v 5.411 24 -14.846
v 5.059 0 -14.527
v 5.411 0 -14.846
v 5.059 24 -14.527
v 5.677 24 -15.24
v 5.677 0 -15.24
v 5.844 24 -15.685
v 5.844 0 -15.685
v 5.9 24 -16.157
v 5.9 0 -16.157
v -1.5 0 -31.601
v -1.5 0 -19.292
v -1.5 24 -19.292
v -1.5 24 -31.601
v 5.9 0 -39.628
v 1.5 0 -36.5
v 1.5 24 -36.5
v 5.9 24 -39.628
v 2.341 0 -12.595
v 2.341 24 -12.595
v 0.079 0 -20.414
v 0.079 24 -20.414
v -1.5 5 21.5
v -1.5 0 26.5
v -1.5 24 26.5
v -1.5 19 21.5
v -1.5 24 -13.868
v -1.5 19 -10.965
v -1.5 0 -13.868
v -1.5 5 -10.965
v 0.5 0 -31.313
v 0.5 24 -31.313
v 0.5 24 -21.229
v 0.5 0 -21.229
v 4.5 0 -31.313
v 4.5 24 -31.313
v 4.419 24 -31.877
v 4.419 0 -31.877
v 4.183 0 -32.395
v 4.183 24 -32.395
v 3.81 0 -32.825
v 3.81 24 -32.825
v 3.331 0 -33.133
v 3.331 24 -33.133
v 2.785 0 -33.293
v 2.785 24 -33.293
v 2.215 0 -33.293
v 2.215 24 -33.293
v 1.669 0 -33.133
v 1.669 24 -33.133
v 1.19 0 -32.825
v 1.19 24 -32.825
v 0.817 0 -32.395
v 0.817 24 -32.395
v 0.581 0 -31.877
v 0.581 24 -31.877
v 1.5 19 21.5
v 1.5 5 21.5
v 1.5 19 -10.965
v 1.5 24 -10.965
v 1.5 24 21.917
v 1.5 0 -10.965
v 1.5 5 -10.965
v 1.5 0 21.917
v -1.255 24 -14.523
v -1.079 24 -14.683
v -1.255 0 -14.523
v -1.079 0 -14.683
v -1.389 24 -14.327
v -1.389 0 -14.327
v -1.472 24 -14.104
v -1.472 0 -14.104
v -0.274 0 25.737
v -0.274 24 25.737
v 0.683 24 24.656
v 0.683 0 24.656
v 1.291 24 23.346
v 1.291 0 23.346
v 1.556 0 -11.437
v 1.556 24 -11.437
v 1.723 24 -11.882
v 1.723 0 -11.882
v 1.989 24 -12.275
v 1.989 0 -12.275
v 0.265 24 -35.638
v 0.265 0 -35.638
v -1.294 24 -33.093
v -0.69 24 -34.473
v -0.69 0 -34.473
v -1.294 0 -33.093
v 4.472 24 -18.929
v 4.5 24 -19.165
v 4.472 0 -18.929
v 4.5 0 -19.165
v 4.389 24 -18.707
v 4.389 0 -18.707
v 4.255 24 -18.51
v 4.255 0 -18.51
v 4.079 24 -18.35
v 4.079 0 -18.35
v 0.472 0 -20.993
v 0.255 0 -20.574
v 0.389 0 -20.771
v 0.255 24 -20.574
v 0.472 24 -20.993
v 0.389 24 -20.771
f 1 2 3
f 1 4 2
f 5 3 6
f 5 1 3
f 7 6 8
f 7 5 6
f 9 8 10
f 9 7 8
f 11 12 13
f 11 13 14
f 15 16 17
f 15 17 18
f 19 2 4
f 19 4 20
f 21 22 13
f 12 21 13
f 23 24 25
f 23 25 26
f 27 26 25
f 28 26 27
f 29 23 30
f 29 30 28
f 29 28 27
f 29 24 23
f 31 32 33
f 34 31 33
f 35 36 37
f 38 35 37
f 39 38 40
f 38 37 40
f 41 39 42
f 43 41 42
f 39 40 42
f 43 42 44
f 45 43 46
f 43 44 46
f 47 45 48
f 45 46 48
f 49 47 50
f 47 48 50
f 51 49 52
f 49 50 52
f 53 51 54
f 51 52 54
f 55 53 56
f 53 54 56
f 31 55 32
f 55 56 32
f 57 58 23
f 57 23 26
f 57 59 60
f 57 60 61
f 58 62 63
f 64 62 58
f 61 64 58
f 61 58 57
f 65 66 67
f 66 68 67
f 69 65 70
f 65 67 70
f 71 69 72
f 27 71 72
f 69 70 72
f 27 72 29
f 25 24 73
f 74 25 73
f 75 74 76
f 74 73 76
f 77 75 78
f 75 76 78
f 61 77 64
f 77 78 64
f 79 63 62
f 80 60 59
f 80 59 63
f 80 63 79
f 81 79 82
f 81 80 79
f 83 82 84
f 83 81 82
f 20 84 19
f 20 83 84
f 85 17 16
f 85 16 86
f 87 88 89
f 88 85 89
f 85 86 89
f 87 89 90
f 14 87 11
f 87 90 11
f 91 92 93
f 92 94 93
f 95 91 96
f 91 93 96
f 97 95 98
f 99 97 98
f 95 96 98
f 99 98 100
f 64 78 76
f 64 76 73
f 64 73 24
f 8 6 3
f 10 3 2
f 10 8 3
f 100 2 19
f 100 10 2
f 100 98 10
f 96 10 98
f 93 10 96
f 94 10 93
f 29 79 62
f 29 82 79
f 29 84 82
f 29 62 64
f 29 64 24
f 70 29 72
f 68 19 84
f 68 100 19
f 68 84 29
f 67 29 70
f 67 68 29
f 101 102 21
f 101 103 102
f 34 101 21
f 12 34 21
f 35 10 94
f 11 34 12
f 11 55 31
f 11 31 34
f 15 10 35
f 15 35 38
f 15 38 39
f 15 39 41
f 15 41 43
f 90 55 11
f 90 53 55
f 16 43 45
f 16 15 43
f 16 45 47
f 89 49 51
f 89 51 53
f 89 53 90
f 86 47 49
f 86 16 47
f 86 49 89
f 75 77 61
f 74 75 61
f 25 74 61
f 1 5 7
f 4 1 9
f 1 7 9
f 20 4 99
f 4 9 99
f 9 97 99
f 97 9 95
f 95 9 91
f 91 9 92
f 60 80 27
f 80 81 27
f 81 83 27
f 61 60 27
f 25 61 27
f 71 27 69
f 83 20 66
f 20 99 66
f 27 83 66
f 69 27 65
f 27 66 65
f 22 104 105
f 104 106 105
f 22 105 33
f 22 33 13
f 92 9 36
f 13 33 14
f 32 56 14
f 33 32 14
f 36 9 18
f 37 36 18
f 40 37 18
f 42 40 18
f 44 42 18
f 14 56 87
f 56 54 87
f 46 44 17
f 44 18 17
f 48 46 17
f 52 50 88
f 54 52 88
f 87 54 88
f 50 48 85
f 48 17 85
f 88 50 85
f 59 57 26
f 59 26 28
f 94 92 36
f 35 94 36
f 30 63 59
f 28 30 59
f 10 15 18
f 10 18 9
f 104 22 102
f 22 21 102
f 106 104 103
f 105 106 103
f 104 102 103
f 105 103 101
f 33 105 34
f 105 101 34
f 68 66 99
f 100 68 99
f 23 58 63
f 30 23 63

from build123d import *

# Parameters (mm, degrees)
BOSS_EXTRUDE1_DEPTH = 24
CUT_EXTRUDE1_DEPTH  = 24
FILLET5_R           = 1
FILLET6_R           = 5.5
FILLET8_R           = 2
SKETCH3_W           = 32.464758902
SKETCH3_H           = 14
CUT_EXTRUDE2_DEPTH  = 10
FILLET9_R           = 5


with BuildPart() as part:
    # Sketch1 → Boss-Extrude1 (new body)
    with BuildSketch(Plane(origin=(0, 0, 0), x_dir=(1, 0, 0), z_dir=(0, 1, 0))):
        Polygon((1.5, 36.5), (5.9, 39.627739059), (5.9, 15.124617794), (1.5, 11.996878735), (1.5, -26.5), (-1.5, -26.5), (-1.5, 36.5), align=None)
    extrude(amount=BOSS_EXTRUDE1_DEPTH)

    # Sketch2 → Cut-Extrude1 (cut)
    with BuildSketch(Plane(origin=(0, 24, 0), x_dir=(1, 0, 0), z_dir=(0, 1, 0))):
        with BuildLine():
            Line((-1.5, 14.383985508), (4.5, 18.649084224))
            Line((4.5, 18.649084224), (4.5, 31.313323891))
            ThreePointArc((4.5, 31.313323891), (2.5, 33.313323891), (0.5, 31.313323891))
            Line((0.5, 31.313323891), (0.5, 20.713323891))
            Line((0.5, 20.713323891), (-1.5, 19.291624318))
            Line((-1.5, 19.291624318), (-1.5, 14.383985508))
        make_face()
    extrude(amount=-CUT_EXTRUDE1_DEPTH, mode=Mode.SUBTRACT)

    # Fillet5
    fillet5_edges = [part.edges().sort_by_distance(p)[0] for p in [
        (-1.5, 12, -14.383985508),
        (0.5, 12, -20.713323891),
        (4.5, 12, -18.649084224),
    ]]
    fillet(fillet5_edges, radius=FILLET5_R)

    # Fillet6
    # the kernel refuses this fillet: 5.5 mm, written as the material it takes off along each edge
    with BuildSketch(Plane(origin=(-1.5, -12.247448714, -36.5), x_dir=(0, 0, 1), z_dir=(0, 1, 0))) as fillet6_piece_1:
        with BuildLine():
            CenterArc((4.898979486, 5.5), FILLET6_R, 207.035691789, 62.964308211)
            Line((0, 3), (-0.09797959, 2.95))
            ThreePointArc((-0.09797959, 2.95), (-0.11, 1.5), (-0.11, 0))
            Line((-0.11, 0), (0, -0.11))
            Line((0, -0.11), (4.898979486, -0.11))
            Line((4.898979486, -0.11), (4.898979486, 0))
        make_face()
    extrude(amount=48.494897428, mode=Mode.SUBTRACT)

    # Fillet8
    fillet8_edges = [part.edges().sort_by_distance(p)[0] for p in [
        (5.9, 12, -15.124617794),
        (1.5, 12, -11.996878735),
    ]]
    fillet(fillet8_edges, radius=FILLET8_R)

    # Sketch3 → Cut-Extrude2 (cut)
    with BuildSketch(Plane(origin=(1.5, 0, 0), x_dir=(0, 0, -1), z_dir=(1, 0, 0))):
        with Locations((-5.267620549, 12)):
            Rectangle(SKETCH3_W, SKETCH3_H)
    extrude(amount=-CUT_EXTRUDE2_DEPTH, mode=Mode.SUBTRACT)

    # Fillet9
    # the kernel refuses this fillet: 5 mm, written as the material it takes off along each edge
    with BuildSketch(Plane(origin=(1.5, -11.456439237, 26.5), x_dir=(0, 0, -1), z_dir=(0, 1, 0))) as fillet9_piece_1:
        with BuildLine():
            CenterArc((4.582575695, 5), FILLET9_R, 203.578178478, 66.421821522)
            Line((0, 3), (-0.091651514, 2.96))
            ThreePointArc((-0.091651514, 2.96), (-0.1, 1.5), (-0.1, 0))
            Line((-0.1, 0), (0, -0.1))
            Line((0, -0.1), (4.582575695, -0.1))
            Line((4.582575695, -0.1), (4.582575695, 0))
        make_face()
    extrude(amount=46.912878475, mode=Mode.SUBTRACT)


solid = part.part
